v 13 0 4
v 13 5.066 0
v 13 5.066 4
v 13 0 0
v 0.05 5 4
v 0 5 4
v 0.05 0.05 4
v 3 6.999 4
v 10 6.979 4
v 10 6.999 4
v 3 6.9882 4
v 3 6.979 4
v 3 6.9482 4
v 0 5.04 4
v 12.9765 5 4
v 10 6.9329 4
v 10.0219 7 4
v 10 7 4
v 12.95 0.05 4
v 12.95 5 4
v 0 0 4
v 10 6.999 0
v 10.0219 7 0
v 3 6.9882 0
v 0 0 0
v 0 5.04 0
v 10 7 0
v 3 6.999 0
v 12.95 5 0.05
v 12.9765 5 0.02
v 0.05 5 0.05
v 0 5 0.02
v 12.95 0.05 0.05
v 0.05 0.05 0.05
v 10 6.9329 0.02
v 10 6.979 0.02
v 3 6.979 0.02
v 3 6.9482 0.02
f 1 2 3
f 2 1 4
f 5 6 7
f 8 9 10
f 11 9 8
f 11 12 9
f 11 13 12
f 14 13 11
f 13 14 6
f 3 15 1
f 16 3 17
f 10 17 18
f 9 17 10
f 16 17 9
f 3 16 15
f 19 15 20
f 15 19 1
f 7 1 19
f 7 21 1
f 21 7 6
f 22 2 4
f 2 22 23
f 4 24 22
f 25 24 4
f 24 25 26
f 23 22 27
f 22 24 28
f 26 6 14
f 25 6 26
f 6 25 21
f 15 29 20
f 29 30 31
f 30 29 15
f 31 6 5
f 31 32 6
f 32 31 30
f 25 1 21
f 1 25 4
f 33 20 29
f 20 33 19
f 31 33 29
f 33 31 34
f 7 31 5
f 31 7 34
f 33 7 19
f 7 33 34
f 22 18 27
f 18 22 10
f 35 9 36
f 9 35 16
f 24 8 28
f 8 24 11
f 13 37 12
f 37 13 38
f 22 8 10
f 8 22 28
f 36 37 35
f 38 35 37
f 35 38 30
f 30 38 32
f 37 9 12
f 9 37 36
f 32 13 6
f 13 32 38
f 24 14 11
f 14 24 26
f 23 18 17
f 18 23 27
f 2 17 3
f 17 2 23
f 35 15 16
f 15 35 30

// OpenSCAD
//creating cubes for the first assignent

//Question-1

//cube([2.5, 2, 2]);
//translate([2, -2, 0]){
  //  cube([3.5, 6, 2]);
    //translate([3, -2, 0]){
      //  cube([2, 10, 2]);
    //}   
//}




//Question -2
//color("#54F1A6"){
//cube([2, 2, 4]);
//translate([2, 0, 0]){
  //  cube([4, 4, 4]);
    //translate([4, 0, 0]){
      // cube([2, 8, 4]); 
       //translate([2, 0, 0]){
         //  cube([2, 10, 4]);  
        //} 
    //}
    
//}
//}






// Question -3 
//module first_part(){
//difference(){
//color("#45B680", 1){
  //  difference(){
    //    cube([3, 5, 2]);
      //  translate([0.02, 0.02, 0.02]){
        //    cube([2.9, 5, 2]);
    //}  
  //}
//}
//translate([0.2, 0.2, 0.2]){
//cube([2.6, 6, 2]);
//}
//}
//}
//module part_two() {
//color("#45B680"){
  //  difference(){
    //difference(){
    //difference(){
     //   cube([9, 3, 2]);
       // translate([0.05, 0.05, 0.05]){
         //   cube([8.9, 2.9, 2]);
        //}
    //}
    //translate([3, -1, 0.05]){
    //cube([2.9, 2, 2]);
    //}
//}
//translate([1.5, 2.5, 0.05]){
//cube([6, 1, 2]);
//}
//}
//}
//}

//module third_part(){
//color("#45B680"){
  //  difference(){
    //cube([6, 2, 2]);
      //  translate([0.05, -0.05, 0.05]){
        //    cube([5.9, 2, 2]);
        //}
    //}    
//}
//}


//first_part();
//translate([-3, 5, 0]){
//part_two();
//}
//translate([-1.5, 8, 0]){
//third_part();
//}











//Question - 4
//color("#59EFD9", 1){
    //cube([2, 4, 3]);
    //translate([2, -2,0]){
        //cube([4, 8, 3]);
        //translate([4, -4, 0]){
            //cube([2, 16, 3]);
            //translate([2, -2, 0]){
                //cube([4, 20, 3]);
                //translate([4, 2, 0]){
                    //cube([2, 16, 3]);
                //}
            //}
        //}
    //}
//}







//Question - 5
//module upper_part(){
//color("#42CFB6"){
  //  rotate([0, 45, 0]){
    //cube([14.142, 3, 14.142]);
//}
//}
//}

//translate([0, 0, 10]){
//upper_part();
//}
//color("#42CFB6"){
//cube([20, 3, 10]);
//}













// Question -6
module tri2(){
difference(){
difference(){
cube([3, 2, 4]);
translate([2, 0,-0.5]){
rotate([0, 0, 57]){
    translate([0.6, -2, 0]){
cube([5, 6, 5]);
    }
}
}
}
translate([3, -2.4, 0.02]){
rotate([0, 0, 57]){
cube([2, 6, 5]);
}
}
}
}

module tri(){
difference(){
difference(){
cube([3, 2, 4]);
    translate([0, 0, 0.02]){
    rotate([0, 0, -57]){
        cube([5, 5, 5]);
    }
}
}
translate([0, 0.04, -0.5]){
rotate([0, 0, 33]){
        cube([5, 5, 5]);
    }
}
}
}

color("#25A5D4"){
difference(){
cube([13, 5, 4]);
translate([0.05, 0.05, 0.05]){
    cube([12.9, 5, 4]);
}
}

translate([3, 4.999, 0]){
difference(){
cube([7, 2, 4]);
translate([-1, -0.02, 0.02]){
    cube([9, 2, 4]);
}
}
}

translate([0, 5, 0]){
tri();
}
translate([10, 5, 0]){
tri2();
}
}





//Question - 7color("#42CFB6"){
//        translate([-3.5, 3, 0]){
  //          cylinder(r=3.5, h=2, $fn=8);
//}
  //      translate([-5.9, 2, 0]){
    //        cylinder(r=3.5, h=2, $fn=8);
//}
//}
